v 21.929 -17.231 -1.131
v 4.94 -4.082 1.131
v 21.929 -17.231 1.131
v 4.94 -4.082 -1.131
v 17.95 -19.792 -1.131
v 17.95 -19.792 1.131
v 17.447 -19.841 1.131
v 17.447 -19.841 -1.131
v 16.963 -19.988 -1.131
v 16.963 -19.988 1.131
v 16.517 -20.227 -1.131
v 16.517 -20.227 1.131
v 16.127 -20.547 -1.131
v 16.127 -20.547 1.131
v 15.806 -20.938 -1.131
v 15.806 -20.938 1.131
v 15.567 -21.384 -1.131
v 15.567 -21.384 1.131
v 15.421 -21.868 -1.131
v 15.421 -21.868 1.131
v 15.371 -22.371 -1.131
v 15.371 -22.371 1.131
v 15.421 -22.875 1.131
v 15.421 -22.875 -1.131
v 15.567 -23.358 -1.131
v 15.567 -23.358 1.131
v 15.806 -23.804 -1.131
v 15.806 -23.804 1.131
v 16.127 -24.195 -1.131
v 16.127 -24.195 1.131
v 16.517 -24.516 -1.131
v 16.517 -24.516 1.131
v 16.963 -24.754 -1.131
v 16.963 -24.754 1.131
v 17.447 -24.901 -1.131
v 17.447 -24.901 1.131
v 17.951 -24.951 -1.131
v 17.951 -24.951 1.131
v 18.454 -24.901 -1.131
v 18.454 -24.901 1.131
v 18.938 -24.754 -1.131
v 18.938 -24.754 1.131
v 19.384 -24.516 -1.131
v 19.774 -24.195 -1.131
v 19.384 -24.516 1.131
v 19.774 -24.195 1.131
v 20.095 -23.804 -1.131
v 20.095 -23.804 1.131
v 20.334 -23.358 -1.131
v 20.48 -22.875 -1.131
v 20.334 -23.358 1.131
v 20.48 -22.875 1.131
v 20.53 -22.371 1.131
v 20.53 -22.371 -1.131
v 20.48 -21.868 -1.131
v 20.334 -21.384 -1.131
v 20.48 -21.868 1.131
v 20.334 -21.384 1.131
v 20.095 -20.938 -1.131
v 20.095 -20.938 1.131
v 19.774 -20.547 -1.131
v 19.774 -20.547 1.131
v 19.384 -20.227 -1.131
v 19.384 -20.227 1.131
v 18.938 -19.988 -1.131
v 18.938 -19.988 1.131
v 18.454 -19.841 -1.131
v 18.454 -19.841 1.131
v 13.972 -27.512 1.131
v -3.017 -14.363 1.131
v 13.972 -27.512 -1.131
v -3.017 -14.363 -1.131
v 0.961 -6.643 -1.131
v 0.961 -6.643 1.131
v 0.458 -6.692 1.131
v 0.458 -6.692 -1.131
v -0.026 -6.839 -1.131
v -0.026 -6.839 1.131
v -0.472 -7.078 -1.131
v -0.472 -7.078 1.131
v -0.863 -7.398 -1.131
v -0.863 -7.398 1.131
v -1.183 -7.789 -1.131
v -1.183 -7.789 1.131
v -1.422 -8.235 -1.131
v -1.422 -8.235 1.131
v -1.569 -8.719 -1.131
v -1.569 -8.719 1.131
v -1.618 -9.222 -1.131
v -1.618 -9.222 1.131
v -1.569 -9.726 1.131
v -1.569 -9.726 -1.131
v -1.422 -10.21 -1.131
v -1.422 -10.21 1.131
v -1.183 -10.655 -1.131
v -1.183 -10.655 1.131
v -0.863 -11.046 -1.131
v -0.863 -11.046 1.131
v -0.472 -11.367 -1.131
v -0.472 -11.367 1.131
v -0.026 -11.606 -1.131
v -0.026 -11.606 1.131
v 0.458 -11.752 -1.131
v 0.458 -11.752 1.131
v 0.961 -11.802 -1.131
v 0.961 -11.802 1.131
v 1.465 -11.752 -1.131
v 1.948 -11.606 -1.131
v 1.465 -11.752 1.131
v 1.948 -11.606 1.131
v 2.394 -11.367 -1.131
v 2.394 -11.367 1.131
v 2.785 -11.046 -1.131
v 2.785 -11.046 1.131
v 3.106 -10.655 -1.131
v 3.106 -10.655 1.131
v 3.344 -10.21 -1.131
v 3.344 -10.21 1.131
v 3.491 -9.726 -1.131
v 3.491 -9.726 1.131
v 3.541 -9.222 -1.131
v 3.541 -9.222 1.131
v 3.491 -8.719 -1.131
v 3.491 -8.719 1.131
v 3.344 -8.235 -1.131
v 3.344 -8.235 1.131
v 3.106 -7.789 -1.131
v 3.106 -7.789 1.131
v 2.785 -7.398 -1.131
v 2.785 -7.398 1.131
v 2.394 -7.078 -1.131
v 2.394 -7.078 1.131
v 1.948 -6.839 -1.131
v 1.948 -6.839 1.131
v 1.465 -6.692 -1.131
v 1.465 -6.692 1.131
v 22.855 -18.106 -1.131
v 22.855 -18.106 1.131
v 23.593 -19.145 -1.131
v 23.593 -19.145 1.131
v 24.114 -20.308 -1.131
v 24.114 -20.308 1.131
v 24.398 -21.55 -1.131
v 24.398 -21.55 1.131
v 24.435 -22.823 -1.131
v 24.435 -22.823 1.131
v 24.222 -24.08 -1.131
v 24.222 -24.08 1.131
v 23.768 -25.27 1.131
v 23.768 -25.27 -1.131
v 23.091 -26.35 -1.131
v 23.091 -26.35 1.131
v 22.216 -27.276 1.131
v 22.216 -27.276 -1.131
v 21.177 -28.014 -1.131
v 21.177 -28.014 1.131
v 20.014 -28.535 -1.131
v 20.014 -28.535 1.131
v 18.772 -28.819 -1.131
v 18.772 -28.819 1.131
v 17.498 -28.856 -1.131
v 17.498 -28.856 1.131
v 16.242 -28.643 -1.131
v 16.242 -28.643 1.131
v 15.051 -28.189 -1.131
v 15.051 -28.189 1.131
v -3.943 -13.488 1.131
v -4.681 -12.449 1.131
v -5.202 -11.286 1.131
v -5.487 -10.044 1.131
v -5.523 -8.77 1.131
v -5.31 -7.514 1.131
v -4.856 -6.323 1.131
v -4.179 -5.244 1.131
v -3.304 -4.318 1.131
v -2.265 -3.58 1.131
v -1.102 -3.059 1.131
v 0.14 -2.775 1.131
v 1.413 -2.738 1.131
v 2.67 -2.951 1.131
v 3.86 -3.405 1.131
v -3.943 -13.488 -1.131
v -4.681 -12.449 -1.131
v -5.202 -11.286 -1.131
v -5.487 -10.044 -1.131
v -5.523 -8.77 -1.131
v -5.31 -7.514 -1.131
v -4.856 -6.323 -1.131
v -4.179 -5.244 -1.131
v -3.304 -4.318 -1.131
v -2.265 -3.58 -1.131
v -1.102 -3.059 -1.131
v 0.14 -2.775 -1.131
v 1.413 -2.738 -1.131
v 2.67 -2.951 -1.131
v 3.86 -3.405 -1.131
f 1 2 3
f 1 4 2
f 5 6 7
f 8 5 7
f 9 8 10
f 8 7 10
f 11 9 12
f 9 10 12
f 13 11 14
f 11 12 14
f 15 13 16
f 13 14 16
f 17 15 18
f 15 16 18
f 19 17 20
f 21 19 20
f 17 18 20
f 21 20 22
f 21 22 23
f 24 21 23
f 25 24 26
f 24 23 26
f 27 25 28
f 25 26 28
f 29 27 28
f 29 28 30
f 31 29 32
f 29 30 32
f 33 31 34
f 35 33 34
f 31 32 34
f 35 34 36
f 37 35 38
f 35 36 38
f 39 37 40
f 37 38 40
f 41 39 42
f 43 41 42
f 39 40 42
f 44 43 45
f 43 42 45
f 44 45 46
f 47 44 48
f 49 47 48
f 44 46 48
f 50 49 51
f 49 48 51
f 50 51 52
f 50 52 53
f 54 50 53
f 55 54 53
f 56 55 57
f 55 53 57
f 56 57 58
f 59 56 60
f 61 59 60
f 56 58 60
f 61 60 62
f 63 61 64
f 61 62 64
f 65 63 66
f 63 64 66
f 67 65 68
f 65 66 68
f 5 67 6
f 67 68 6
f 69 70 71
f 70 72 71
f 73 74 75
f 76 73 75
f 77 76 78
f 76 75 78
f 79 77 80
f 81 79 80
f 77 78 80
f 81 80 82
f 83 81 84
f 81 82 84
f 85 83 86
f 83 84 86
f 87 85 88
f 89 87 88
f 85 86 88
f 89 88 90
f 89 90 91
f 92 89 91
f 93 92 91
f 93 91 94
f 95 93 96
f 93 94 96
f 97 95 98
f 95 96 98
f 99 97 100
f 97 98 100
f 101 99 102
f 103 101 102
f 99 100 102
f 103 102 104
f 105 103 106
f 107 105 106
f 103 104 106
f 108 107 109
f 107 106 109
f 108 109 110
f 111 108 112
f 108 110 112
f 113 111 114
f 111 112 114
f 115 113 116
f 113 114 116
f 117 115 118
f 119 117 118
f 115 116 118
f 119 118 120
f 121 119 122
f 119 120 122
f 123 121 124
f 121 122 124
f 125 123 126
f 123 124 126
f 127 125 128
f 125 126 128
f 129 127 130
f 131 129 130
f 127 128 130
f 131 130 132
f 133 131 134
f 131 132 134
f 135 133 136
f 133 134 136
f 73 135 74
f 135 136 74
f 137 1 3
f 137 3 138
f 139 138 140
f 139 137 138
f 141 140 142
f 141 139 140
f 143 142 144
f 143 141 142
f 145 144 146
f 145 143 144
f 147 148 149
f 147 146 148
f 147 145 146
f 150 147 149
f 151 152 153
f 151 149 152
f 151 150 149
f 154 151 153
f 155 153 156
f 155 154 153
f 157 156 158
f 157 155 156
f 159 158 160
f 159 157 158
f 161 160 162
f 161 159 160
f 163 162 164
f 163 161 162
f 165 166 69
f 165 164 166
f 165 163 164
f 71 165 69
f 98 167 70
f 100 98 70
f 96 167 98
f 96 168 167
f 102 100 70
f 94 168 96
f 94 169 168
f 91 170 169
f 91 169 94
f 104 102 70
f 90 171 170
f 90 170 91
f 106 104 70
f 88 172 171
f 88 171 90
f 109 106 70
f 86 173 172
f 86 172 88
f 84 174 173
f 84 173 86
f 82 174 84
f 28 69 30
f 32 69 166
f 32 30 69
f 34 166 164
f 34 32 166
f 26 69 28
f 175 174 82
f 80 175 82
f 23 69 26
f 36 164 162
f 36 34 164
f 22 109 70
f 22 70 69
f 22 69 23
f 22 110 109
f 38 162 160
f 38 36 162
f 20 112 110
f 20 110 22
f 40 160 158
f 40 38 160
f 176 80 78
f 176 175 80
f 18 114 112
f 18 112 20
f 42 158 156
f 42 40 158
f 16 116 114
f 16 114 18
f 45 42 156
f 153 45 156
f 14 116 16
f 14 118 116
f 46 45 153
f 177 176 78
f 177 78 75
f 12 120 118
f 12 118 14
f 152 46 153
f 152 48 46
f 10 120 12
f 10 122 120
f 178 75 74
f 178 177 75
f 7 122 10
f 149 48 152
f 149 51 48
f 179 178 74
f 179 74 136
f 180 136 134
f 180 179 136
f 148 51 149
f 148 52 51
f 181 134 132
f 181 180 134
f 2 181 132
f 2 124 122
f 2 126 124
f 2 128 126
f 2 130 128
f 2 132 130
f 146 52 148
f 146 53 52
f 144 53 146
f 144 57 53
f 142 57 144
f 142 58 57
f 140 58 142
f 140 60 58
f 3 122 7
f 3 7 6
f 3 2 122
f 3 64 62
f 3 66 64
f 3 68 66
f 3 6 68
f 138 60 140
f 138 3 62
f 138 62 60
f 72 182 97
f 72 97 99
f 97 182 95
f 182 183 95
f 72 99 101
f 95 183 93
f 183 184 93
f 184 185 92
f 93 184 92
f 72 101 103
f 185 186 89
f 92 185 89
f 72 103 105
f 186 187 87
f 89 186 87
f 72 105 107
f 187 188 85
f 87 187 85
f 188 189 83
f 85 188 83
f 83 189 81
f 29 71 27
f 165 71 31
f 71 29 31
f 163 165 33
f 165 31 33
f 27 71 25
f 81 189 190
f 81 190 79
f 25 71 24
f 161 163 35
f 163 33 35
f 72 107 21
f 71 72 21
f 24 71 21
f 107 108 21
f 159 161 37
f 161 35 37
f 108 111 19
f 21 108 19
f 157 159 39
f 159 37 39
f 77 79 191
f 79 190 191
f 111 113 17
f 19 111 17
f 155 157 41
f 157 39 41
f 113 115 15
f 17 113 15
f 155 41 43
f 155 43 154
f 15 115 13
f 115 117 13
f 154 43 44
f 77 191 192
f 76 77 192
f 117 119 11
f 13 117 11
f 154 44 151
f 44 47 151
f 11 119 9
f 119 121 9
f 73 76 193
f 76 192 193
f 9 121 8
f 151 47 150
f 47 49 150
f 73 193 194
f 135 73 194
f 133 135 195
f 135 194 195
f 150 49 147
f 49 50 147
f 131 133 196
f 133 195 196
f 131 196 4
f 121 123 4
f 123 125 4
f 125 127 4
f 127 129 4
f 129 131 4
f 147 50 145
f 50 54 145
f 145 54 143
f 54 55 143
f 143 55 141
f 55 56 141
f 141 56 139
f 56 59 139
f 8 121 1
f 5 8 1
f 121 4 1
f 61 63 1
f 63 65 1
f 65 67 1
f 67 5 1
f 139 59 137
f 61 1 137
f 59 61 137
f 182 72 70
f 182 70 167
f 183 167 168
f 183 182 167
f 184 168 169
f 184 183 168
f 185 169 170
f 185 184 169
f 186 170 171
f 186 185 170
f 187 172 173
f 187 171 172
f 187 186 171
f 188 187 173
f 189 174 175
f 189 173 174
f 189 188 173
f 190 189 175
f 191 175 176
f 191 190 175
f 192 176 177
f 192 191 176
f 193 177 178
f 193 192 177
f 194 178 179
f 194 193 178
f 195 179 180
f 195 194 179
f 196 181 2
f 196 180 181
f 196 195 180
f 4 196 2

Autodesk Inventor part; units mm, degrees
ref_plane "YZ Plane" through (0, 0, 0) normal (1, 0, 0) x (0, 1, 0)
ref_plane "XZ Plane" through (0, 0, 0) normal (0, 1, 0) x (-1, 0, 0)
ref_plane "XY Plane" through (0, 0, 0) normal (0, 0, 1) x (1, 0, 0)
sketch "Sketch1" plane through (0, 0, 0) normal (0, 0, 1) x (1, 0, 0)
  arc A0 (4.9396, -4.0821) -> (-3.0171, -14.3627) centre (0.9613, -9.2224) ccw
  arc A1 (13.9722, -27.5116) -> (21.9289, -17.231) centre (17.9505, -22.3713) ccw
  line L0 (4.9396, -4.0821) -> (21.9289, -17.231)
  line L1 (-3.0171, -14.3627) -> (13.9722, -27.5116)
  point P0 (0, 0)
  dimension "d0" = 13
  dimension "d1" = 13
extrude "Extrusion1" add sketch "Sketch1" along normal mid plane 2.2625
hole "Hole1" at (0.9613, -9.2224, 0) at (17.9505, -22.3713, 0) direction (0, 0, 1) diameter 5.159 end through all both
properties part number "smallthing"
